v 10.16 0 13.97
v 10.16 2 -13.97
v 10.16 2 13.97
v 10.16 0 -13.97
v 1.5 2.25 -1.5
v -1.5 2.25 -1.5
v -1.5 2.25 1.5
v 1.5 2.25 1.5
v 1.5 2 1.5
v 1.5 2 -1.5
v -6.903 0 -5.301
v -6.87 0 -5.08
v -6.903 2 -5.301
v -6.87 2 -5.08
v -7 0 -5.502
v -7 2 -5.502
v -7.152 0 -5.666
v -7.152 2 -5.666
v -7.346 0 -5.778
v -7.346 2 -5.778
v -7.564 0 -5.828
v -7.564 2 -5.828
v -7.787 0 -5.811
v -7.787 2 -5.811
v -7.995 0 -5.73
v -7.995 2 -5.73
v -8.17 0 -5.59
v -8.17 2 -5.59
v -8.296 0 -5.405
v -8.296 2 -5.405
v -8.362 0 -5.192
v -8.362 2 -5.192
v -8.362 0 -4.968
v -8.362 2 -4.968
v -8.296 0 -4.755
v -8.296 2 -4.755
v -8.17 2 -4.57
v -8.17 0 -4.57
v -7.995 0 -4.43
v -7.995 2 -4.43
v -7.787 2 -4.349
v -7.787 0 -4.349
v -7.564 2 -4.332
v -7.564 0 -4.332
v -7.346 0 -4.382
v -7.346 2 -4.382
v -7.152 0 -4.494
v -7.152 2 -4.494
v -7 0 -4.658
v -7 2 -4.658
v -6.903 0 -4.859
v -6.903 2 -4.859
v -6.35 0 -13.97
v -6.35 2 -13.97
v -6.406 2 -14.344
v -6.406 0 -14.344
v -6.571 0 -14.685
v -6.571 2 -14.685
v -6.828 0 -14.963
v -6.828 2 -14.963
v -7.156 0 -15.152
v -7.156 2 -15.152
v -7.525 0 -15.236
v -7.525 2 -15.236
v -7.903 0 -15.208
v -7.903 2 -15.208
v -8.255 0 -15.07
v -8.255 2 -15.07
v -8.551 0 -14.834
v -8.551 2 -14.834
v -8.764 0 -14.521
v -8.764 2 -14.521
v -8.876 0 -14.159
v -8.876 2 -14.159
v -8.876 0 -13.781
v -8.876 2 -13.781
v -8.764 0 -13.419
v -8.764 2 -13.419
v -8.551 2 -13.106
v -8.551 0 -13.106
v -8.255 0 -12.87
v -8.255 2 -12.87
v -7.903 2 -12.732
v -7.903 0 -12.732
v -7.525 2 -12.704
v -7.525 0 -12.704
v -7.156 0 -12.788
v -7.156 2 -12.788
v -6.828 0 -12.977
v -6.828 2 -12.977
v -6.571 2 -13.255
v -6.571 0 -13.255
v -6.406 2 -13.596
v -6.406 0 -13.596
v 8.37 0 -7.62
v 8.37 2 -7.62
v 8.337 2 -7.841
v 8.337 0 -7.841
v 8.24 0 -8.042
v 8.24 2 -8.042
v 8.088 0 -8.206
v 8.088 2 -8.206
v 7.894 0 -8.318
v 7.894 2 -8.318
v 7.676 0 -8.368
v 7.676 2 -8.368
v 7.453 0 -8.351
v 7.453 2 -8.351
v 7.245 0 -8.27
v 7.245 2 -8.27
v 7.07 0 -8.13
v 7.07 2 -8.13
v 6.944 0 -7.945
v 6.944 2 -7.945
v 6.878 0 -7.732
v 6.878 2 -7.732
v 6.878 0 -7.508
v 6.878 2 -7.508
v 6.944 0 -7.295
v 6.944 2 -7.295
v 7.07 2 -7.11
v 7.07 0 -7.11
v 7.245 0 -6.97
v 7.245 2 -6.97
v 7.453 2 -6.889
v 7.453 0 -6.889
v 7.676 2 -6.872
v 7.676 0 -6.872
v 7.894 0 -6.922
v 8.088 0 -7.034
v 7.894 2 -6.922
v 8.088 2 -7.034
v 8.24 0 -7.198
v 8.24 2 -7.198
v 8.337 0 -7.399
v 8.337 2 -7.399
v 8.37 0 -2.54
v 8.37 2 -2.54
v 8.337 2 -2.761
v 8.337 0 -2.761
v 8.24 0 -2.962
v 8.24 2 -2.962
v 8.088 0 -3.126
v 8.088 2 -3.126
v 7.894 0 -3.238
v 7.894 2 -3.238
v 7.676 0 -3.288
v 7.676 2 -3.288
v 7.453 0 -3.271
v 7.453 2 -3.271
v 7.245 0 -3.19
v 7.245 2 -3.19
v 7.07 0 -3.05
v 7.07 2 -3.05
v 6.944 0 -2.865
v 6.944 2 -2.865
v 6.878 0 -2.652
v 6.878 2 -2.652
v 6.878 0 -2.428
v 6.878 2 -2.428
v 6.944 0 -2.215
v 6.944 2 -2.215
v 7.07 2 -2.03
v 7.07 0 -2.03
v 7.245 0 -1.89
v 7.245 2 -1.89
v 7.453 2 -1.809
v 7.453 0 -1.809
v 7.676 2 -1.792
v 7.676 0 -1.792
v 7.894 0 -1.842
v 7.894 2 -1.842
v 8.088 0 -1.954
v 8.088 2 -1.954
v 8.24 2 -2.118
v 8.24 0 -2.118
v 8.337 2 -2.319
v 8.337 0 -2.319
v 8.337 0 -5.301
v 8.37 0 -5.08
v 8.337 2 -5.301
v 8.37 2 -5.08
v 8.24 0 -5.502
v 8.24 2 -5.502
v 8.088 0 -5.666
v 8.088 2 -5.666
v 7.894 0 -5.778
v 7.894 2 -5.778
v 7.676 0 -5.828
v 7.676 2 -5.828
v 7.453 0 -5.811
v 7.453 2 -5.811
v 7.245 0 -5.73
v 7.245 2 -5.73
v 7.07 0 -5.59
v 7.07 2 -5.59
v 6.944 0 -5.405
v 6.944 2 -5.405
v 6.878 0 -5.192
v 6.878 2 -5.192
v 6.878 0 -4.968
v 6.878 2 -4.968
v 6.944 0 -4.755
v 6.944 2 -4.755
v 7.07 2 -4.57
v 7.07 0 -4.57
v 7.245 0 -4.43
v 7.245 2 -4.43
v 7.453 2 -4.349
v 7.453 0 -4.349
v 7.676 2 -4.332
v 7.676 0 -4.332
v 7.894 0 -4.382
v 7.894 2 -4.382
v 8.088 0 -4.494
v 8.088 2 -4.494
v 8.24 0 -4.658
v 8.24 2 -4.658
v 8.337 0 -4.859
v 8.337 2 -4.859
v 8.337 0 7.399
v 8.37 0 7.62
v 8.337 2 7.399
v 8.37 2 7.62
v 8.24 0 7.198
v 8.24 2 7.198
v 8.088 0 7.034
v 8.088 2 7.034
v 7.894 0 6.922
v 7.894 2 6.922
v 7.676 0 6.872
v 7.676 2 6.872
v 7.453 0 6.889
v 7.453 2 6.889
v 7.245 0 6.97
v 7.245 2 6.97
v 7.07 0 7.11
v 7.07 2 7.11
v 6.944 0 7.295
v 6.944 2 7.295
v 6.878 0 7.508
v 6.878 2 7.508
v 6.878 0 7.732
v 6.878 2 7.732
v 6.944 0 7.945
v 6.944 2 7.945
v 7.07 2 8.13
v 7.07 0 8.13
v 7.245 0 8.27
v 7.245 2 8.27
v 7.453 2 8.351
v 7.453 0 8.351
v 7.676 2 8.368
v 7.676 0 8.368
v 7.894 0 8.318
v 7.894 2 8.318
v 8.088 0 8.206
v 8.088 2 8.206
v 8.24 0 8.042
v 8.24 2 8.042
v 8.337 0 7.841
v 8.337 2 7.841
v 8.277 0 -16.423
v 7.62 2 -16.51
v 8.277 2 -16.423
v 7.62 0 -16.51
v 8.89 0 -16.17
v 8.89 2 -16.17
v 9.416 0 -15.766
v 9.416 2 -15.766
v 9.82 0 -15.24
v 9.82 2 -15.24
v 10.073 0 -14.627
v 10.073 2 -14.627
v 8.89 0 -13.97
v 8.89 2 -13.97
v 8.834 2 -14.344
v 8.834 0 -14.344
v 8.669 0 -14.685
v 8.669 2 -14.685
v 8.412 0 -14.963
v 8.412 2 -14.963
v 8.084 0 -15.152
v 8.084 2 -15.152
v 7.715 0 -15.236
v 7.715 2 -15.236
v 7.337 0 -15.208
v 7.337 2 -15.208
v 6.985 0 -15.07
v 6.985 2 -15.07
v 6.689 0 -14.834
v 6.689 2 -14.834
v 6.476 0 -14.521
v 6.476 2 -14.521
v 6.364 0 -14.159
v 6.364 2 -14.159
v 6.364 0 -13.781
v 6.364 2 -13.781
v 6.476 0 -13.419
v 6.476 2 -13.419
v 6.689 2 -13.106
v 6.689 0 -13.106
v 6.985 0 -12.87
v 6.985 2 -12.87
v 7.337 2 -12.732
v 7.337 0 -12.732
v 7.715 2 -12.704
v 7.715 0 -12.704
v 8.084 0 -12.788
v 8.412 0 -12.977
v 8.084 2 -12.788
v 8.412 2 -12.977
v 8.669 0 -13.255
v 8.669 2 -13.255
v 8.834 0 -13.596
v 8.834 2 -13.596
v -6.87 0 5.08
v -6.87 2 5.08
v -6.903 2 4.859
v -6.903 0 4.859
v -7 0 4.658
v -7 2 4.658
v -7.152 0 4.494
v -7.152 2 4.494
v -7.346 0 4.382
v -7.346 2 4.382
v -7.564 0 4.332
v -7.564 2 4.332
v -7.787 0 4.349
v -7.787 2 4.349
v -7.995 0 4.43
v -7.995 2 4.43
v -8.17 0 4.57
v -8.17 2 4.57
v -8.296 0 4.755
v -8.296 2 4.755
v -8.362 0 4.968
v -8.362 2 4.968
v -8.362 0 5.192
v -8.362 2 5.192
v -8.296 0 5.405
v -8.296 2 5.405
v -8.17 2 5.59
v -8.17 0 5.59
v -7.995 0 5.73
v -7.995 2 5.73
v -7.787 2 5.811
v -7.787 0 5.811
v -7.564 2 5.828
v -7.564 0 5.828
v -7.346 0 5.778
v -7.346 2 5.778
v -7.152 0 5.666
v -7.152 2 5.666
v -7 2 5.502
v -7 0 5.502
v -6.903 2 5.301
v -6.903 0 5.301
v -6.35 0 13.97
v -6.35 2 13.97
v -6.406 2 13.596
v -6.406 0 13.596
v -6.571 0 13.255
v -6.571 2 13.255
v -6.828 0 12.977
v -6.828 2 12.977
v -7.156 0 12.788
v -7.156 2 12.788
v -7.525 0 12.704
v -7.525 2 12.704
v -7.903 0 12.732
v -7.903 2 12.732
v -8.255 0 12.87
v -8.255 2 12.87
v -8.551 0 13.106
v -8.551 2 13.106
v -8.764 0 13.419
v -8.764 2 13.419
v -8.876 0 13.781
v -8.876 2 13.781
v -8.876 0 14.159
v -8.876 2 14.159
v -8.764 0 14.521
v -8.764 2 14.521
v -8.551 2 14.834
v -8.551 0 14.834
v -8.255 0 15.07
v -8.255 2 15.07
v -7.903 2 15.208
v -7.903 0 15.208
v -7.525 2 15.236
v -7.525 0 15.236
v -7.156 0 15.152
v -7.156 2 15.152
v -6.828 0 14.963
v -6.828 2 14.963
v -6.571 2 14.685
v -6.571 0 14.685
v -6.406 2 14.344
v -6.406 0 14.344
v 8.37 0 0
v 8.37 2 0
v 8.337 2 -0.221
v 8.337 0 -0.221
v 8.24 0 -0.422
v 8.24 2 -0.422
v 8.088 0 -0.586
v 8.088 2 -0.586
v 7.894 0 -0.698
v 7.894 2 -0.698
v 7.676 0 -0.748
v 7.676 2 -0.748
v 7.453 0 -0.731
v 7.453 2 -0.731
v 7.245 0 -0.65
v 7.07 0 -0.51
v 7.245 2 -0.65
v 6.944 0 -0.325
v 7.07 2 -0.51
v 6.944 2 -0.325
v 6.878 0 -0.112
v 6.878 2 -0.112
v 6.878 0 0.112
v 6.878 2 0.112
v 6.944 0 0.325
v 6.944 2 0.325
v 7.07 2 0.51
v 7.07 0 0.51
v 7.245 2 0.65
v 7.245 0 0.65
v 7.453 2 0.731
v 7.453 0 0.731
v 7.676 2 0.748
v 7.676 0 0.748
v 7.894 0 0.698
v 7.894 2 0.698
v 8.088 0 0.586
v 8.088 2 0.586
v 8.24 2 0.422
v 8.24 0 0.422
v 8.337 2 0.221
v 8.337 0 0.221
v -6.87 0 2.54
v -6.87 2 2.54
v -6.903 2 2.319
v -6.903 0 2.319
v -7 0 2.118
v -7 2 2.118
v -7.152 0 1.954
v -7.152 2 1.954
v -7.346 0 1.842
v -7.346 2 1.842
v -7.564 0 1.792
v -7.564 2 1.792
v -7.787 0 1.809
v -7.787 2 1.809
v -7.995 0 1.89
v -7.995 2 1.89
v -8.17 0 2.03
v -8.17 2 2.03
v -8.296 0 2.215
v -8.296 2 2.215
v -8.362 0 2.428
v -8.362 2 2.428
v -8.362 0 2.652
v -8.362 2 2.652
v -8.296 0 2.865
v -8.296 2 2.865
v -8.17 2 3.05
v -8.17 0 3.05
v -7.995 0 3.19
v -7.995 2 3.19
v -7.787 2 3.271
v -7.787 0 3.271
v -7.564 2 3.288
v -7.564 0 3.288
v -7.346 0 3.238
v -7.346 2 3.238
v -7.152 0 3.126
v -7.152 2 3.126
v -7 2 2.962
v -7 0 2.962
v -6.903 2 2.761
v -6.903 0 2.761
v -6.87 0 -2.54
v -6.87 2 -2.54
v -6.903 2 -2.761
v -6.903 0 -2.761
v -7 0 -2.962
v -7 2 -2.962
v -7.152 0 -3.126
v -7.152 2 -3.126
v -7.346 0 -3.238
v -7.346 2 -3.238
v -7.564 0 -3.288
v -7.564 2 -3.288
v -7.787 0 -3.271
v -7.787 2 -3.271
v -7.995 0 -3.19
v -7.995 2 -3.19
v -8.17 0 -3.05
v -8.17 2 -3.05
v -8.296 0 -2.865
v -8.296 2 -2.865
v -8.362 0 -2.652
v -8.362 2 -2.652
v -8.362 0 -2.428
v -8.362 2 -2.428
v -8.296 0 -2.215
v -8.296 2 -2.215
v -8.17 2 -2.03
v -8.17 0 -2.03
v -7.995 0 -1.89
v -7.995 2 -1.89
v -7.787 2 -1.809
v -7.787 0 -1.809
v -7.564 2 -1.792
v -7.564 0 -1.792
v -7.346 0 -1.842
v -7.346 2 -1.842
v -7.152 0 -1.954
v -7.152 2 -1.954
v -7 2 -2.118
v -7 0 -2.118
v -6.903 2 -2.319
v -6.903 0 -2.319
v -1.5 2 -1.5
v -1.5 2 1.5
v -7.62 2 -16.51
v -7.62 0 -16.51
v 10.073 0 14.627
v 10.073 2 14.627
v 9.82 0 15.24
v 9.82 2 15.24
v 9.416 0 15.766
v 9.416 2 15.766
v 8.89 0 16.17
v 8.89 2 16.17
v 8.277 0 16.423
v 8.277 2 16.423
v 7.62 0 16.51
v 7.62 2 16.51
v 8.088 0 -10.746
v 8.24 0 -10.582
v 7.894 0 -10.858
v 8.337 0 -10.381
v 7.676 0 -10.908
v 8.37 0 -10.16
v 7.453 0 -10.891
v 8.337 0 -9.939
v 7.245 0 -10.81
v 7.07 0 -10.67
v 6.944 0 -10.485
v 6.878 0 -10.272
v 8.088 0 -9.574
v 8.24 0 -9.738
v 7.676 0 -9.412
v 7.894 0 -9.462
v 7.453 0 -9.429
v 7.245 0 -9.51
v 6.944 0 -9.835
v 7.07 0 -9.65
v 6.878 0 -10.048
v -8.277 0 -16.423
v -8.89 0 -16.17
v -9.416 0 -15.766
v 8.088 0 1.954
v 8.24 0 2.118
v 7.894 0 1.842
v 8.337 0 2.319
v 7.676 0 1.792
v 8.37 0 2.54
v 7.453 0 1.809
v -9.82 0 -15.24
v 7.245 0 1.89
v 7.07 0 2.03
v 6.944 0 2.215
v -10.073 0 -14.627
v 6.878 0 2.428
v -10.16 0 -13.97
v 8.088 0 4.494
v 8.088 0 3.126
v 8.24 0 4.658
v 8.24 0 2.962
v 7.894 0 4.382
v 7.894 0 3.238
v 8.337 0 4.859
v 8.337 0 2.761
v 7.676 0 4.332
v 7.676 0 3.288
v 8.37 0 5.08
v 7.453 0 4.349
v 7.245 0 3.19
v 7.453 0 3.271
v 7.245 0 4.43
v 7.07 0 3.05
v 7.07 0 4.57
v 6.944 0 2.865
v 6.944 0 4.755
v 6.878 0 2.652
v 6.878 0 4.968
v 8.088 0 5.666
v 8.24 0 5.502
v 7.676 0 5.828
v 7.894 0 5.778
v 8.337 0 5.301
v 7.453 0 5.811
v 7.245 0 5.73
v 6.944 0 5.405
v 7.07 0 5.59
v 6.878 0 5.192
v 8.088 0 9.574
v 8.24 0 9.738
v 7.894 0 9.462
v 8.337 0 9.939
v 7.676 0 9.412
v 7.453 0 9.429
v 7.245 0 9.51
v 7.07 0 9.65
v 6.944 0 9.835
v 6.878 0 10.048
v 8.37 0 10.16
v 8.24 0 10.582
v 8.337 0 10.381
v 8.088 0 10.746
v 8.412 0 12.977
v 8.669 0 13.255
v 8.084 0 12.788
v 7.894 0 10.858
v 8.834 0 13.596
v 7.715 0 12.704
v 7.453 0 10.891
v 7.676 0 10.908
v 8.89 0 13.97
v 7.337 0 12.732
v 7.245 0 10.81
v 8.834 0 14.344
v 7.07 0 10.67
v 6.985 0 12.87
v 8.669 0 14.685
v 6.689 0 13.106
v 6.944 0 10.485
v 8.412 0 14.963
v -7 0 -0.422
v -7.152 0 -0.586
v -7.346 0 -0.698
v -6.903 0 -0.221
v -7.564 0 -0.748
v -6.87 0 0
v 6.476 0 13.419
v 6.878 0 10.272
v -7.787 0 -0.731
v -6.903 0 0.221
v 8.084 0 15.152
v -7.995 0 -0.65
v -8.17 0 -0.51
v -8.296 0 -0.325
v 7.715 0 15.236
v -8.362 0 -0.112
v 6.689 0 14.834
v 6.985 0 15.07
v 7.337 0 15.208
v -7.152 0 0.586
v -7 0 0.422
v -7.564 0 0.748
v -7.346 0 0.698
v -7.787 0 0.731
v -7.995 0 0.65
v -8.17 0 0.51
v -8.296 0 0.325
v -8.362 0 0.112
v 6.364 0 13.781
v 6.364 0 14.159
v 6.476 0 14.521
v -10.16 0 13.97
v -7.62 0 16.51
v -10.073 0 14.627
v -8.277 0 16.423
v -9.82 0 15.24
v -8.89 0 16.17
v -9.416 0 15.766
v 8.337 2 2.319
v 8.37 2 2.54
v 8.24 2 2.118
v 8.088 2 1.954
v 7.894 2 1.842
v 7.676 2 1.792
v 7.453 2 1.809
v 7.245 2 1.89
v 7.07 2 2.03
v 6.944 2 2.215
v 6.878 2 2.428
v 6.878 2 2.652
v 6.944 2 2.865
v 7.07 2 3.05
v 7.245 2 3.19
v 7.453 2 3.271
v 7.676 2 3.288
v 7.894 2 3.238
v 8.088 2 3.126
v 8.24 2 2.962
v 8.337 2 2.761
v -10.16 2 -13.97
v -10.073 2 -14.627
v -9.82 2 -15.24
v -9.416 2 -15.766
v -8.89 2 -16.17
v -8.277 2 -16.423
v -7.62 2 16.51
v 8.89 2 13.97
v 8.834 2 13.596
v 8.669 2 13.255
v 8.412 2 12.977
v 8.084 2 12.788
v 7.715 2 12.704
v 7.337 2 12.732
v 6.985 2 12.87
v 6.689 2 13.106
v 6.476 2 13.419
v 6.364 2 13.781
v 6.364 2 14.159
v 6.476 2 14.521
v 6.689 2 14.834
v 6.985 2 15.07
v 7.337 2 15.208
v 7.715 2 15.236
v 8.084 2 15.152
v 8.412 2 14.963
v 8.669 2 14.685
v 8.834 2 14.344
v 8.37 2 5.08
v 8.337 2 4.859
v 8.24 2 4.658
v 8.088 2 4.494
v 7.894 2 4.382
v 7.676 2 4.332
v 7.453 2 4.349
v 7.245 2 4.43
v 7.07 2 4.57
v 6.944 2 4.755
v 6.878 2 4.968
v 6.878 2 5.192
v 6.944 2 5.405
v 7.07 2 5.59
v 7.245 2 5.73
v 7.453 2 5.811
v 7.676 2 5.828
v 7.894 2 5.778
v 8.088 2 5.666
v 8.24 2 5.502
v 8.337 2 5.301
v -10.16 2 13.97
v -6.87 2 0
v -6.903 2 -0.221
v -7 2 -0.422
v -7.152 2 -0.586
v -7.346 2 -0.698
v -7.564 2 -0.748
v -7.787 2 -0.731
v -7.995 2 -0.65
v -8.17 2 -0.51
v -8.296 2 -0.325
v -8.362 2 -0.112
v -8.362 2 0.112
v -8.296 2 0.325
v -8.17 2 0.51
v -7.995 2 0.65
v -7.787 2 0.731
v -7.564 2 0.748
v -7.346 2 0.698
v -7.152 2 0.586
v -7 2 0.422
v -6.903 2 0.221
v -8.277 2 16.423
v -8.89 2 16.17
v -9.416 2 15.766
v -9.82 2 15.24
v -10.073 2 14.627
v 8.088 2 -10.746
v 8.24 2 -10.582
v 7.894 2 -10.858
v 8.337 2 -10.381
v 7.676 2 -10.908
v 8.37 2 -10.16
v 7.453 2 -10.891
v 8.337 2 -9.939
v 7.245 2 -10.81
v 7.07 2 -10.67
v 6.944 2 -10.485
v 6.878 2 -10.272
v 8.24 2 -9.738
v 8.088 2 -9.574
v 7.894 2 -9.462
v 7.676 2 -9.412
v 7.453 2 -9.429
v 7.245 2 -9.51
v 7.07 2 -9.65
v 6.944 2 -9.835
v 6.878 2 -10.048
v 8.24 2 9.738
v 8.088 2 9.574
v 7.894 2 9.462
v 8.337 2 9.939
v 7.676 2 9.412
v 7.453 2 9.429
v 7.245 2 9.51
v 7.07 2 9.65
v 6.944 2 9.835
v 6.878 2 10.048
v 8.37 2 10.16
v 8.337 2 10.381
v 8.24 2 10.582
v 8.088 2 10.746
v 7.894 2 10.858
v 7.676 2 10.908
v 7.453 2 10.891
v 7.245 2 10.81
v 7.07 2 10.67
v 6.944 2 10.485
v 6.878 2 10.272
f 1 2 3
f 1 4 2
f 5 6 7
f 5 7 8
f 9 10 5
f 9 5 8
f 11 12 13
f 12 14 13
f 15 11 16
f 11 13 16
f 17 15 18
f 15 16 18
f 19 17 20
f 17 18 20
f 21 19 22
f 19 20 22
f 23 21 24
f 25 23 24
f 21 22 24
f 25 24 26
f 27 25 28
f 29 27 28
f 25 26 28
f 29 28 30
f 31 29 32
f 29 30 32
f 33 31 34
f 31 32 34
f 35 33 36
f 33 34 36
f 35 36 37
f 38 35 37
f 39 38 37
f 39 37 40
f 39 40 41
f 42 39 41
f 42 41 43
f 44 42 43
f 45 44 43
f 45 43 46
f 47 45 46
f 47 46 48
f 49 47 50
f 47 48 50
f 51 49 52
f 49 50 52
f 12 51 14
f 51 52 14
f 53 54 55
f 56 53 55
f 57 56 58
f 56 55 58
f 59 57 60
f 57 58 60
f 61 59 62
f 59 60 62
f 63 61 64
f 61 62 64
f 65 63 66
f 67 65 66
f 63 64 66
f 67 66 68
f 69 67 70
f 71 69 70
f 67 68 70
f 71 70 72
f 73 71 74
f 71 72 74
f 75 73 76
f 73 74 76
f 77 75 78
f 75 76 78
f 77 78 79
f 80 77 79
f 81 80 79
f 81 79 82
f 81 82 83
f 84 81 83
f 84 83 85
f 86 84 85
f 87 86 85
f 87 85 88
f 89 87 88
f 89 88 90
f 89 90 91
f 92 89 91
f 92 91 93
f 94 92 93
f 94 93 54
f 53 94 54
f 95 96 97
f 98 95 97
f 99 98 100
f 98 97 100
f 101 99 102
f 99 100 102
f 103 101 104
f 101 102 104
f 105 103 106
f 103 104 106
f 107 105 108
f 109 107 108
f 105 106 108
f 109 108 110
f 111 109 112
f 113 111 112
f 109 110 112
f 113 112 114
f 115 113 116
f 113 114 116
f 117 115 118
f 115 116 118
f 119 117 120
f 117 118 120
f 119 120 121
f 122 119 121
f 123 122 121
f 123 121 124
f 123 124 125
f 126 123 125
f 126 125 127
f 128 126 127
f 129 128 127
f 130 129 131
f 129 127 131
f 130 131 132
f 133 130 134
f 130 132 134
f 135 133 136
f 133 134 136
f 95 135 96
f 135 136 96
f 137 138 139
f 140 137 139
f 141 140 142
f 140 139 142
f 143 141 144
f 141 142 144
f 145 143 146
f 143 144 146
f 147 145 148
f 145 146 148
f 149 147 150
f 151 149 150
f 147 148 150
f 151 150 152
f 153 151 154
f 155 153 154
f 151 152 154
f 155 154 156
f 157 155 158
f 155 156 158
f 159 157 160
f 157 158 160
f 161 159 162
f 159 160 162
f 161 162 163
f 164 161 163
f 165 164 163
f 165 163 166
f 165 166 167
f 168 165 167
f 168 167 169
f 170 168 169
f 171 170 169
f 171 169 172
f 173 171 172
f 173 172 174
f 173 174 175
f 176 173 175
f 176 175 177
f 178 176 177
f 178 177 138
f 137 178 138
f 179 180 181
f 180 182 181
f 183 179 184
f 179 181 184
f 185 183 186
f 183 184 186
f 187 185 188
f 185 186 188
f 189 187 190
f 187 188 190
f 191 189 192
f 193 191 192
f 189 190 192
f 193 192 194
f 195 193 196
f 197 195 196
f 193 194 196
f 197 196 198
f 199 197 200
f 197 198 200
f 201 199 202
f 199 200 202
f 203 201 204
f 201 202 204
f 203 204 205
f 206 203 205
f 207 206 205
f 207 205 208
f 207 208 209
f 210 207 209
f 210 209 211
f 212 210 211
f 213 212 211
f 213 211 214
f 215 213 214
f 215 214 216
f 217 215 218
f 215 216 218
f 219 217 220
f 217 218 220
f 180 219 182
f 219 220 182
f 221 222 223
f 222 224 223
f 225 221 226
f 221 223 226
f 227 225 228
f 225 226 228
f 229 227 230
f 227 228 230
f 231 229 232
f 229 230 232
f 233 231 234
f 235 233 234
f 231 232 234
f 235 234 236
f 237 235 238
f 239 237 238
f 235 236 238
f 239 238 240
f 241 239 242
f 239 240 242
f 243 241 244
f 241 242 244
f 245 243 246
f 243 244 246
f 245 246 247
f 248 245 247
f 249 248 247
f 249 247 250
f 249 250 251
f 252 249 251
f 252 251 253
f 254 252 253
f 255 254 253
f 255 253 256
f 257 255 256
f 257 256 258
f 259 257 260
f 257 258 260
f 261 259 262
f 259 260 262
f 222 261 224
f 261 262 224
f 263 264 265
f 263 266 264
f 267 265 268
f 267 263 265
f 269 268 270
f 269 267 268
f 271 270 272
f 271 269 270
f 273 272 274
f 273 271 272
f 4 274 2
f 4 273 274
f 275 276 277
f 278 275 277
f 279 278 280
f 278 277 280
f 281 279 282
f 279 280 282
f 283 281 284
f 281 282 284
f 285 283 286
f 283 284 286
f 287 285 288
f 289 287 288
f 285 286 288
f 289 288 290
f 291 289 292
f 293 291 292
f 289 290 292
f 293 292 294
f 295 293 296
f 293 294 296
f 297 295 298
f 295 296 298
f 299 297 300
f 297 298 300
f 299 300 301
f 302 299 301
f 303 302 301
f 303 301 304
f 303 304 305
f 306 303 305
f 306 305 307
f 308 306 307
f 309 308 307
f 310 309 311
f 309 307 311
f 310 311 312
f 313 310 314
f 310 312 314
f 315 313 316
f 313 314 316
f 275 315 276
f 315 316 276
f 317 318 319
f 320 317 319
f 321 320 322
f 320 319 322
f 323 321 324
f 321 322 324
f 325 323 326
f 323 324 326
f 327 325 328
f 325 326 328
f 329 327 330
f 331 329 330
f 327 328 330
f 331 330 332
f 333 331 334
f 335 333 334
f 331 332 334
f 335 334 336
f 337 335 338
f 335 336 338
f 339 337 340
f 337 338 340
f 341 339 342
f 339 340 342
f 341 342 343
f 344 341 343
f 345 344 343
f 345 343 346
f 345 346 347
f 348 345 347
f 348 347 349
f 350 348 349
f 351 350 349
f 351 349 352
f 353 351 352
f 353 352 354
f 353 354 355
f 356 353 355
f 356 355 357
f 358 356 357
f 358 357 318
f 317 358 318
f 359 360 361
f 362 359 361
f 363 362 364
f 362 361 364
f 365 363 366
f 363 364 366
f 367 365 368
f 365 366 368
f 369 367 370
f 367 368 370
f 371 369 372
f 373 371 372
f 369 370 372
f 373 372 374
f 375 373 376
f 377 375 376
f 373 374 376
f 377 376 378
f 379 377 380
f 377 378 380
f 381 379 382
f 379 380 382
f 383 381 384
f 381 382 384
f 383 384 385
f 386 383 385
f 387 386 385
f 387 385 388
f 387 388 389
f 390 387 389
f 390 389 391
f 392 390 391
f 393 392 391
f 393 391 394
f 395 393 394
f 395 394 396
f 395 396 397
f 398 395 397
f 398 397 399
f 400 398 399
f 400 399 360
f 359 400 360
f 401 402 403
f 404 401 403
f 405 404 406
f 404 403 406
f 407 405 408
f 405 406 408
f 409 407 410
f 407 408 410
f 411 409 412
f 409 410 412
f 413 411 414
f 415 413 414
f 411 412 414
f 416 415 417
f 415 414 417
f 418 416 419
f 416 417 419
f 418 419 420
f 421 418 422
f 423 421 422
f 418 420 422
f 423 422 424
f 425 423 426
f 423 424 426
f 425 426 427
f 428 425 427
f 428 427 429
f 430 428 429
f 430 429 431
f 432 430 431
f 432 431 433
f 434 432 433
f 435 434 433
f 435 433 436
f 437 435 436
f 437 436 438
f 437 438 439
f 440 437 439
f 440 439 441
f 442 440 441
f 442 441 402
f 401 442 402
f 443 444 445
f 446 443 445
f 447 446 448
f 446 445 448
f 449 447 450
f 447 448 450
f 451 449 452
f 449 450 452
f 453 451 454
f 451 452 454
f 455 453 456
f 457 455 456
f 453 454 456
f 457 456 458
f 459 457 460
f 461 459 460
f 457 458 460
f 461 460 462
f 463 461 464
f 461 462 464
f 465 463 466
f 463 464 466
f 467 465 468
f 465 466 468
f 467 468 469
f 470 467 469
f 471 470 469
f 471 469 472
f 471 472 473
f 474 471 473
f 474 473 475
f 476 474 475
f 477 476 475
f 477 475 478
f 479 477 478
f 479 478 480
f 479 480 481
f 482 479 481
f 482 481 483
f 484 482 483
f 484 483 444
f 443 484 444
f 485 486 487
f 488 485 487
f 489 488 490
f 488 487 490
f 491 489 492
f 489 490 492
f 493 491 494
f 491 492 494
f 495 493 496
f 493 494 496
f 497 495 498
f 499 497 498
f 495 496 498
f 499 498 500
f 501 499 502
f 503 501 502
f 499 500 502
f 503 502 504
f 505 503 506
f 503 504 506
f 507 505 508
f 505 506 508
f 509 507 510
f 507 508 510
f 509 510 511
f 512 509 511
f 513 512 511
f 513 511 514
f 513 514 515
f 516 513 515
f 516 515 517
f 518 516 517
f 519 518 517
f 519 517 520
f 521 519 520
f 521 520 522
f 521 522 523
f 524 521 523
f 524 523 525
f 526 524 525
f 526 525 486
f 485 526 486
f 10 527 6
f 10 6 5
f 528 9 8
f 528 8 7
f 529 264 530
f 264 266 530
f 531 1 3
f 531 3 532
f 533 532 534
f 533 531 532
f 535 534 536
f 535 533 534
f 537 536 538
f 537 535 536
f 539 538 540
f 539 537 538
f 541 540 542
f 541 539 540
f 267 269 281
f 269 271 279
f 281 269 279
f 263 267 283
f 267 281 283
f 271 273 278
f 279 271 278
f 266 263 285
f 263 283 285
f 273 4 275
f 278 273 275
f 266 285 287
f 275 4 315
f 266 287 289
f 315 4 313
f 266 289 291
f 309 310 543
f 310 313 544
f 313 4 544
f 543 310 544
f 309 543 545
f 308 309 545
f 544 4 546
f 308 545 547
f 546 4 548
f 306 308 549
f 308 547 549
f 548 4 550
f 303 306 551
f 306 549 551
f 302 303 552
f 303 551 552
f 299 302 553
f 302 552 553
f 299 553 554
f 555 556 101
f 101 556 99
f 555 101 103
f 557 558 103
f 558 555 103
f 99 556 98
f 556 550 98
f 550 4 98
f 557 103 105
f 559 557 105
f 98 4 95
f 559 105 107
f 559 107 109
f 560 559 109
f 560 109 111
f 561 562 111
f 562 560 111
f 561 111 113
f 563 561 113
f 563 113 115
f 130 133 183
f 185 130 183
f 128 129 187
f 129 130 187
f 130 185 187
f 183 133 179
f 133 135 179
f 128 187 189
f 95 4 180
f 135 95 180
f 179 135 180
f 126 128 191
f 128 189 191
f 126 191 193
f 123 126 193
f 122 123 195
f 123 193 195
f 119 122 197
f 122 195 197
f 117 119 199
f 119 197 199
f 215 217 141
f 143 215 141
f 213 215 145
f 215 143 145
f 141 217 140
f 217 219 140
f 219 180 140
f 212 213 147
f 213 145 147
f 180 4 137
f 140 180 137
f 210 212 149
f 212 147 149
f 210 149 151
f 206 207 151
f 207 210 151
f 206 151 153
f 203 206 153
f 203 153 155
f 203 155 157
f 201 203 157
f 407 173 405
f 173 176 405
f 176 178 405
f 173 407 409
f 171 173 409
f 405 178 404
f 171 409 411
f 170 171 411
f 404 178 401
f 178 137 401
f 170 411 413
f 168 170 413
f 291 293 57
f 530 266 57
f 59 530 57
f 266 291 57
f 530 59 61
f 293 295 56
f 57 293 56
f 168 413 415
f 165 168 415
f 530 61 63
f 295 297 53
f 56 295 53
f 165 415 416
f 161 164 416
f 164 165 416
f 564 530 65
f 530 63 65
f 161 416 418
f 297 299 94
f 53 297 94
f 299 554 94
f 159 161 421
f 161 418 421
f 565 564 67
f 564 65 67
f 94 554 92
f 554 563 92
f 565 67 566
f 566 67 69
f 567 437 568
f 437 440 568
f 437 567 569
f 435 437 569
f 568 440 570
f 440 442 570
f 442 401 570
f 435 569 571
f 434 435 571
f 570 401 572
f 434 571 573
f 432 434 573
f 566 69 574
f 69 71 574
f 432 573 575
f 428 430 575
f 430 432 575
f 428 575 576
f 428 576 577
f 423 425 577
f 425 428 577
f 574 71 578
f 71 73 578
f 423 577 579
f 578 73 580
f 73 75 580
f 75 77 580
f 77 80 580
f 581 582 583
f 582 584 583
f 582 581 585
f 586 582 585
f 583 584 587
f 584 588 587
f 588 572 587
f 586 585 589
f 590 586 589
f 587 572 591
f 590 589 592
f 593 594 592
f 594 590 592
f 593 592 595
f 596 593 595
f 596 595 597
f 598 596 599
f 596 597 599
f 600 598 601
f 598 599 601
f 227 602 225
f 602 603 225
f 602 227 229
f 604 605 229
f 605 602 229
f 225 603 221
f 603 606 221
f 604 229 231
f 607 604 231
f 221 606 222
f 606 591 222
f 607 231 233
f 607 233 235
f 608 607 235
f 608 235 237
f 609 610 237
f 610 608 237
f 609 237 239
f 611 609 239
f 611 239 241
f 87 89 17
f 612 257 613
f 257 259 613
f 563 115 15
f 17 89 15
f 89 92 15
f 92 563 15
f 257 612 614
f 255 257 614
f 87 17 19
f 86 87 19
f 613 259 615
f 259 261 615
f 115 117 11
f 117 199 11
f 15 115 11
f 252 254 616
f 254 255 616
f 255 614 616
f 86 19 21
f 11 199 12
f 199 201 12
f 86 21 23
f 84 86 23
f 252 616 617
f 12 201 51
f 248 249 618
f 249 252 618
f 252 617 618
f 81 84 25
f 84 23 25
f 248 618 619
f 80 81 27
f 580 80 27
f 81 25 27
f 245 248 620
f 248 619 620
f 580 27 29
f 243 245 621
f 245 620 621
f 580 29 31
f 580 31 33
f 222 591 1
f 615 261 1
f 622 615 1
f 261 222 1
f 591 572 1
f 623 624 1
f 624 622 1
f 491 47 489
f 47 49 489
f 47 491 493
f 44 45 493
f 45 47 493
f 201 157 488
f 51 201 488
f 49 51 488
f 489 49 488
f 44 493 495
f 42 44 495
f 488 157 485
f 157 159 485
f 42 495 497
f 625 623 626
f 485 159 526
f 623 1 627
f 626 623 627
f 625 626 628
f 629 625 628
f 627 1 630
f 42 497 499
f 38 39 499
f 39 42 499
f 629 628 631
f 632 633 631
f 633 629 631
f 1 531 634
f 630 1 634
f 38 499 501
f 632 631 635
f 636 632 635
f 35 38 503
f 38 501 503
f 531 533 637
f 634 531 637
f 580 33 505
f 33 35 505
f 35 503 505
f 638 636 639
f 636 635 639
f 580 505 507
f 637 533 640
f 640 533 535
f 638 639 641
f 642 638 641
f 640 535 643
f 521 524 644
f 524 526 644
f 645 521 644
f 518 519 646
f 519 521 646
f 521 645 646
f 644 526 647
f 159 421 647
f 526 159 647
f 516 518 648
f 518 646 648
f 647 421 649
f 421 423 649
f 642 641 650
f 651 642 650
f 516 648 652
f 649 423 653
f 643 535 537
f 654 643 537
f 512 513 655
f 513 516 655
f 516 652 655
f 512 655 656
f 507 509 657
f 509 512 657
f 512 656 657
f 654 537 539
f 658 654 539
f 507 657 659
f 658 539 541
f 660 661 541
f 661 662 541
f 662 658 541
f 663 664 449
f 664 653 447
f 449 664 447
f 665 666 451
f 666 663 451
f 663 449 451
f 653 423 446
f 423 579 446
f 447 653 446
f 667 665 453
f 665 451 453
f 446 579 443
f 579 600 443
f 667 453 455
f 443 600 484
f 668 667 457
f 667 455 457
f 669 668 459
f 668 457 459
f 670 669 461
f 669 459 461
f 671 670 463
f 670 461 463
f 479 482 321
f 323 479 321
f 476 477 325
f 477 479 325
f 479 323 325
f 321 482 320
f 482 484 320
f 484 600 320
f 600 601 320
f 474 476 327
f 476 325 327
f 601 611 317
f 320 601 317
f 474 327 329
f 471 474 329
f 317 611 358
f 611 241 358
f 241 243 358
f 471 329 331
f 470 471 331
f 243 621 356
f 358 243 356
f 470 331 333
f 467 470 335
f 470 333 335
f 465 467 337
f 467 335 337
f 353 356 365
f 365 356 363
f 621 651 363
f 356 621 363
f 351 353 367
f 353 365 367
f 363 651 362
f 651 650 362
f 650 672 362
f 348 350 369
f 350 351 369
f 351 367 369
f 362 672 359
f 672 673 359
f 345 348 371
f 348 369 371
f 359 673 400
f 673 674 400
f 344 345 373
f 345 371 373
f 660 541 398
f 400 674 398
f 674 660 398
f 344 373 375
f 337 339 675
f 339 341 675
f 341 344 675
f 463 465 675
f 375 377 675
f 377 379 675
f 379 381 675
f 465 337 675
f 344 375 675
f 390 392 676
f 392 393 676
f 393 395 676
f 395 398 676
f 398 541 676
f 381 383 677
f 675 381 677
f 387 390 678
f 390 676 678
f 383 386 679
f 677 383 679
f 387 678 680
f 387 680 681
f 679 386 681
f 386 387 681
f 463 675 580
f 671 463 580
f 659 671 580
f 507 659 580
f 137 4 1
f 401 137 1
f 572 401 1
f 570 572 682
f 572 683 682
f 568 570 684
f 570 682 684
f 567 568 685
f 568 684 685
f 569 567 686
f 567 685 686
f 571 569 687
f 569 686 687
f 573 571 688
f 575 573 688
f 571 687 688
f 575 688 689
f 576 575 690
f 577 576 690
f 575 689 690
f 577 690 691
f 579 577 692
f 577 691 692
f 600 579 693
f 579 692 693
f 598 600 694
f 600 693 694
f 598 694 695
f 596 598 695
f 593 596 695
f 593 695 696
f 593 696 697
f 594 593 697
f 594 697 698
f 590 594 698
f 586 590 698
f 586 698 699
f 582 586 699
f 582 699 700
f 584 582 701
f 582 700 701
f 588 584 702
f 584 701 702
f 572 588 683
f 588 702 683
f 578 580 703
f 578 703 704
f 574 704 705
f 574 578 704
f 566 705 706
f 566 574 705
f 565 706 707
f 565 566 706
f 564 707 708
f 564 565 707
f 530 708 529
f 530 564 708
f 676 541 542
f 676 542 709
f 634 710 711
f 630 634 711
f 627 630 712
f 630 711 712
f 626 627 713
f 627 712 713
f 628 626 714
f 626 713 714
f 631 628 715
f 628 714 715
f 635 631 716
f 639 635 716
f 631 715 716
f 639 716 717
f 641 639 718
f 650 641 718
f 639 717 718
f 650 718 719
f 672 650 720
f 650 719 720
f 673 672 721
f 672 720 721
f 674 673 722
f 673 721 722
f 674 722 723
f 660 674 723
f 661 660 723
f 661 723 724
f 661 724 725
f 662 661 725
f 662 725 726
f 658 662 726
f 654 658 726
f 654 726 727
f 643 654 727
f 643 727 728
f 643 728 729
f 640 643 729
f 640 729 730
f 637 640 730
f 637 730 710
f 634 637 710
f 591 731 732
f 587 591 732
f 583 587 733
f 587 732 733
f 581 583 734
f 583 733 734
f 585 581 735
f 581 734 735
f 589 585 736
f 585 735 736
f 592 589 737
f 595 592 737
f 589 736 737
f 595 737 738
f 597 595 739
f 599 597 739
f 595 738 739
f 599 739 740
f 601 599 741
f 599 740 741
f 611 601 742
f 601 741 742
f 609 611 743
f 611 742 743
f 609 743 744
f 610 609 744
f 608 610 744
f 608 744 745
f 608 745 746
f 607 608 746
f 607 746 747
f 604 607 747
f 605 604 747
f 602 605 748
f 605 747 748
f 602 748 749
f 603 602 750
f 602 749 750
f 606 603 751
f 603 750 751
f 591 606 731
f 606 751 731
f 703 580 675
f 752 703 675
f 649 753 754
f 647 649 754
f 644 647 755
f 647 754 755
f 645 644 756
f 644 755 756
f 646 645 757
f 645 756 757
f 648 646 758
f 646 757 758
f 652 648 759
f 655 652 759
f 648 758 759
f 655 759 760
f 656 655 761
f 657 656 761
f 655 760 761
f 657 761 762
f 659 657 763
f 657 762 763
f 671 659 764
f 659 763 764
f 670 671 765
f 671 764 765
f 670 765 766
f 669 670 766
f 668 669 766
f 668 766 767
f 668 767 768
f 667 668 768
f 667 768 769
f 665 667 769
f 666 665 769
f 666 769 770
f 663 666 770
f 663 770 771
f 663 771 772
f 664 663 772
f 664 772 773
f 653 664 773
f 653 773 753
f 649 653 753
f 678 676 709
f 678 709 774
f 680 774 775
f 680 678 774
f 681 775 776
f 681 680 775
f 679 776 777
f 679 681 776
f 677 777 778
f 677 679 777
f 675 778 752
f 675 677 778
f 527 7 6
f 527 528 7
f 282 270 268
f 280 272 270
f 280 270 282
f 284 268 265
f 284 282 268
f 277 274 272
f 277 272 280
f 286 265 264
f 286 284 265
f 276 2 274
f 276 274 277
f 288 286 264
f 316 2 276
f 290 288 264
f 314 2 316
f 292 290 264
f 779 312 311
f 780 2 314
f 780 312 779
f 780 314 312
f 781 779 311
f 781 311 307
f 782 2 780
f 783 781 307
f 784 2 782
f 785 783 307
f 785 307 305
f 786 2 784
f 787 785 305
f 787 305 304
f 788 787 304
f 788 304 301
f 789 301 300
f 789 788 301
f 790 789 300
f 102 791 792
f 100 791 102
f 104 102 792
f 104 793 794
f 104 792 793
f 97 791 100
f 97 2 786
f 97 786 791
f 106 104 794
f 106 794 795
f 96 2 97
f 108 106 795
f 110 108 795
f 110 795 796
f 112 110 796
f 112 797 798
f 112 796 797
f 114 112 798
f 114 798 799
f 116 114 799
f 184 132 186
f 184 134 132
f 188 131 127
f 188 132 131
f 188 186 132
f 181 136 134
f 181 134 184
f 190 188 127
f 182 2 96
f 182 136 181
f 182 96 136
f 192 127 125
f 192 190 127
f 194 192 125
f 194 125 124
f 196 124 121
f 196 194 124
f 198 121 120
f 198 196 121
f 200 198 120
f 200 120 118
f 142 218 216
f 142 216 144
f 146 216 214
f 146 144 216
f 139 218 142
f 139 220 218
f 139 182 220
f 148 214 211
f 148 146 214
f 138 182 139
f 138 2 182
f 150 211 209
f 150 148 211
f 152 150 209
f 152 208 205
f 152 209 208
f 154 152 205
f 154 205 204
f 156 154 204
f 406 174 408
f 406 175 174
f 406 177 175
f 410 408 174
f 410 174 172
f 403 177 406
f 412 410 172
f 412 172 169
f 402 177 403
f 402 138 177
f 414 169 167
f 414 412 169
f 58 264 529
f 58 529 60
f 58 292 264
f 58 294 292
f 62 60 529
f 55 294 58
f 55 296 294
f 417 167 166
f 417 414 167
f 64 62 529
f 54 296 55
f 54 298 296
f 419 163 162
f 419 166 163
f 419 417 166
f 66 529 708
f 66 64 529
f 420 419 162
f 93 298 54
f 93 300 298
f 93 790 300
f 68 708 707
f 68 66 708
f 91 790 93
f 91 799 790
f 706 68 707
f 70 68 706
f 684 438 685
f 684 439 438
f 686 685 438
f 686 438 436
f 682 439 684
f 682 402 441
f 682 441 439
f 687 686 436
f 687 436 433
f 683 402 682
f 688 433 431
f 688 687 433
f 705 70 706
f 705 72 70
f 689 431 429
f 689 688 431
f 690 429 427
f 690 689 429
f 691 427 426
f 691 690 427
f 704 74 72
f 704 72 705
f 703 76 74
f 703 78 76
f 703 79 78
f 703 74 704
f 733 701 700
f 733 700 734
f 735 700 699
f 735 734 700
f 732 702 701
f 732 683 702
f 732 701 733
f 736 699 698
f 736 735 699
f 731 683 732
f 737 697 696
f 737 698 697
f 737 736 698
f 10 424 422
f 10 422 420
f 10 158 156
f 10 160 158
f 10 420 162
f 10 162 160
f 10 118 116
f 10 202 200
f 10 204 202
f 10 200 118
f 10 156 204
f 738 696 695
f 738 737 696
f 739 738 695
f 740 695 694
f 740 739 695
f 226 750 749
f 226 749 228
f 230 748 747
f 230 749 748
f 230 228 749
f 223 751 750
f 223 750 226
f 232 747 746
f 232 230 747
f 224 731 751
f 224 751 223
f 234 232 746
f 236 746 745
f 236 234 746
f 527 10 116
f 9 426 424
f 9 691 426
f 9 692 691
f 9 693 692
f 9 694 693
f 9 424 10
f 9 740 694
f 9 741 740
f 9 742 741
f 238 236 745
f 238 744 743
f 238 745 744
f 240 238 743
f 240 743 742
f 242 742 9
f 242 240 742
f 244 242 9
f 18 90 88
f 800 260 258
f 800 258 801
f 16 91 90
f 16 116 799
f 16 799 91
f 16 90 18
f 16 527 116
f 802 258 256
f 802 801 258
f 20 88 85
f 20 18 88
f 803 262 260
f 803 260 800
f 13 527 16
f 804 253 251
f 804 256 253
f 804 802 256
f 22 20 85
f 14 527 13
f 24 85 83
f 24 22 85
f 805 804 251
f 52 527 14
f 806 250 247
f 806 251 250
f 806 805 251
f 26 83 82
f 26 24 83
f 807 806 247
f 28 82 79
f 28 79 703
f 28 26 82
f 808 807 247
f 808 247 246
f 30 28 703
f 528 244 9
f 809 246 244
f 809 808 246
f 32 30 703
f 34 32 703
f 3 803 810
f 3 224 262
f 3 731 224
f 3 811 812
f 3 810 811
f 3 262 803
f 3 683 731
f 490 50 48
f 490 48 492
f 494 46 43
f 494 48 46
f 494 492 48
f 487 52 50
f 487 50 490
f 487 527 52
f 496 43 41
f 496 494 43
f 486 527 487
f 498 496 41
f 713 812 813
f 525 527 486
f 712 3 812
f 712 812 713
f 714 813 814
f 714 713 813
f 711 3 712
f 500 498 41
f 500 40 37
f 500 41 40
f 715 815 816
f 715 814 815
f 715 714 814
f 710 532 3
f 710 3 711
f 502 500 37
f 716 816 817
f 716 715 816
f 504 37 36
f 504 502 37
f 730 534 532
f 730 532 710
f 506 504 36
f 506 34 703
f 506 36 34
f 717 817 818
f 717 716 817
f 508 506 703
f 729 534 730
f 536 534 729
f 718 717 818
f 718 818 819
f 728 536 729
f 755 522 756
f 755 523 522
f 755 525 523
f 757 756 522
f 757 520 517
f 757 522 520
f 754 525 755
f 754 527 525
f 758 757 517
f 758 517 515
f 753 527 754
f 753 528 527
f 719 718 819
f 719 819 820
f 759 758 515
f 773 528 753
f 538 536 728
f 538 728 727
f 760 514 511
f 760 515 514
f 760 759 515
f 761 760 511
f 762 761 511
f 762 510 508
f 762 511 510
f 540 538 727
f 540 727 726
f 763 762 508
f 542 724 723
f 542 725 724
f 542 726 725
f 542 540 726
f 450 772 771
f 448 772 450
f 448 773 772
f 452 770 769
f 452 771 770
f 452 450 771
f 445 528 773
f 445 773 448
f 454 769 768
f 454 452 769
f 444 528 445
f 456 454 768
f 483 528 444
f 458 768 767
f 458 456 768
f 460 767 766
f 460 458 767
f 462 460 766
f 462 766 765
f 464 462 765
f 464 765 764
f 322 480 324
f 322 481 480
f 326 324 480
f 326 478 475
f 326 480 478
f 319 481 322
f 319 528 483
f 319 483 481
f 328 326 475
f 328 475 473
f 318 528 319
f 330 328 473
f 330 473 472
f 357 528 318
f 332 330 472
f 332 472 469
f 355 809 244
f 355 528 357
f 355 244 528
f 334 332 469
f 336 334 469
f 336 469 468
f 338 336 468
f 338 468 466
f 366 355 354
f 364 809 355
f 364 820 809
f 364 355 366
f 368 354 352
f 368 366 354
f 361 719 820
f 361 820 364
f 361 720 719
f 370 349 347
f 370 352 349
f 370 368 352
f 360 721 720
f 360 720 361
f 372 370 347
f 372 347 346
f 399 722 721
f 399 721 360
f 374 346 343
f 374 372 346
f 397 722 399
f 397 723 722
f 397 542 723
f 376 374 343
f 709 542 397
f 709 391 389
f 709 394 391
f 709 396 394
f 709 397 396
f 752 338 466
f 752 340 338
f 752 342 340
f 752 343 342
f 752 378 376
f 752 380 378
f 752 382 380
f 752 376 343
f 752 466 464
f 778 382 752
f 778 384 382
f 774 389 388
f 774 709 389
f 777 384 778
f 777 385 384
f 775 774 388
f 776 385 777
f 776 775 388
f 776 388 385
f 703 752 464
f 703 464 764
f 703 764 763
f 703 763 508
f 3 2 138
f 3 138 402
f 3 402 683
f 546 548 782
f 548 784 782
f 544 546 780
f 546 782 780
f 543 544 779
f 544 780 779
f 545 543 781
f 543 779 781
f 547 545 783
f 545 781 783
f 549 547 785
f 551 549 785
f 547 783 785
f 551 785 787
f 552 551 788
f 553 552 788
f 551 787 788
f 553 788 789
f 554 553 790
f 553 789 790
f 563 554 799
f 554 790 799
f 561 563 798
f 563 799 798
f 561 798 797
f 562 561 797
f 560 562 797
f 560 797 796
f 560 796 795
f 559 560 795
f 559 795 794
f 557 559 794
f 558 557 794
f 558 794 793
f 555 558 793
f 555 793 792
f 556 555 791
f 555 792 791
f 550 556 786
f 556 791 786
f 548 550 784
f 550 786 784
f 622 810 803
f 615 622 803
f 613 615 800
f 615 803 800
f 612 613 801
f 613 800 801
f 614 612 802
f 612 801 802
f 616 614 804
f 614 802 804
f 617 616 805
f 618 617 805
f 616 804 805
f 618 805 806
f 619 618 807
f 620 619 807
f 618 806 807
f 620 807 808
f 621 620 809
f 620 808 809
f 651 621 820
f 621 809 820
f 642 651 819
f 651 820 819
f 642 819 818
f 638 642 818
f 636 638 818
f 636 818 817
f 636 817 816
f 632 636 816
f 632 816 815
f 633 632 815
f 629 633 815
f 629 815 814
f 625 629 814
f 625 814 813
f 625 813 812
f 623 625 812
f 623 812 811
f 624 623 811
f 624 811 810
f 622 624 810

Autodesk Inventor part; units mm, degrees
ref_plane "YZ Plane" through (0, 0, 0) normal (1, 0, 0) x (0, 1, 0)
ref_plane "XZ Plane" through (0, 0, 0) normal (0, 1, 0) x (-1, 0, 0)
ref_plane "XY Plane" through (0, 0, 0) normal (0, 0, 1) x (1, 0, 0)
sketch "Sketch1" plane through (0, 0, 0) normal (0, 1, 0) x (-1, 0, 0)
  line L0 (0, 0) -> (10.16, 0)
  line L1 (10.16, 0) -> (10.16, -13.97)
  line L2 (10.16, 0) -> (10.16, 13.97)
  line L3 (10.16, 0) -> (24.13, 0) construction
  line L4 (0, 0) -> (-10.16, 0)
  line L5 (0, 0) -> (10.16, 0) construction
  line L6 (-10.16, 0) -> (-10.16, -13.97)
  line L7 (-10.16, 0) -> (-10.16, 13.97)
  line L8 (-10.16, 13.97) -> (-7.62, 13.97)
  arc A0 (-7.62, 16.51) -> (-10.16, 13.97) centre (-7.62, 13.97) ccw
  line L9 (-7.62, 13.97) -> (-7.62, 16.51) construction
  line L10 (-7.62, 13.97) -> (-10.16, 13.97) construction
  line L11 (0, 0) -> (0, -1)
  line L12 (10.16, 13.97) -> (7.62, 13.97)
  line L13 (10.16, 13.97) -> (12.7, 13.97) construction
  arc A1 (10.16, 13.97) -> (7.62, 16.51) centre (7.62, 13.97) ccw
  line L14 (7.62, 13.97) -> (7.62, 16.51) construction
  line L15 (7.62, 13.97) -> (10.16, 13.97) construction
  line L16 (-7.62, 16.51) -> (7.62, 16.51)
  line L17 (10.16, -13.97) -> (7.62, -13.97)
  line L18 (10.16, -13.97) -> (12.7, -13.97) construction
  line L19 (-10.16, -13.97) -> (-7.62, -13.97)
  arc A2 (7.62, -16.51) -> (10.16, -13.97) centre (7.62, -13.97) ccw
  arc A3 (-10.16, -13.97) -> (-7.62, -16.51) centre (-7.62, -13.97) ccw
  line L20 (-7.62, -16.51) -> (7.62, -16.51)
  dimension "d0" = 10.16
  dimension "d1" = 13.97
  dimension "d2" = 13.97
  dimension "d3" = 90
  dimension "d4" = 10.16
  dimension "d5" = 180
  dimension "d6" = 13.97
  dimension "d7" = 13.97
  dimension "d8" = 2.54
  dimension "d9" = 90
  dimension "d11" = 1
  dimension "d12" = 2.54
  dimension "d13" = 180
  dimension "d14" = 90
  dimension "d15" = 2.54
  dimension "d16" = 180
  dimension "d17" = 2.54
  dimension "d18" = 15.24
extrude "Extrusion1" add sketch "Sketch1" along normal blind 2
sketch "Sketch2" plane through (0, 2, 0) normal (0, 1, 0) x (1, 0, 0)
  line L0 (0, 0) -> (7.62, 0)
  line L1 (0, 0) -> (-7.62, 0)
  circle A0 centre (7.62, 0) radius 0.75
  line L2 (0, 0) -> (0, 1)
  circle A1 centre (7.62, 2.54) radius 0.75
  circle A2 centre (7.62, 5.08) radius 0.75
  circle A3 centre (7.62, 7.62) radius 0.75
  circle A4 centre (7.62, 10.16) radius 0.75
  circle A5 centre (7.62, -2.54) radius 0.75
  circle A6 centre (7.62, 0) radius 0.75
  circle A7 centre (7.62, 2.54) radius 0.75
  circle A8 centre (7.62, 5.08) radius 0.75
  circle A9 centre (7.62, 7.62) radius 0.75
  circle A10 centre (7.62, -5.08) radius 0.75
  circle A11 centre (7.62, -2.54) radius 0.75
  circle A12 centre (7.62, 0) radius 0.75
  circle A13 centre (7.62, 2.54) radius 0.75
  circle A14 centre (7.62, 5.08) radius 0.75
  circle A15 centre (7.62, -7.62) radius 0.75
  circle A16 centre (7.62, -5.08) radius 0.75
  circle A17 centre (7.62, -2.54) radius 0.75
  circle A18 centre (7.62, 0) radius 0.75
  circle A19 centre (7.62, 2.54) radius 0.75
  circle A20 centre (7.62, -10.16) radius 0.75
  circle A21 centre (7.62, -7.62) radius 0.75
  circle A22 centre (7.62, -5.08) radius 0.75
  circle A23 centre (7.62, -2.54) radius 0.75
  circle A24 centre (7.62, 0) radius 0.75
  circle A25 centre (-7.62, 0) radius 0.75
  circle A26 centre (-7.62, 2.54) radius 0.75
  circle A27 centre (-7.62, 5.08) radius 0.75
  circle A28 centre (-7.62, -2.54) radius 0.75
  circle A29 centre (-7.62, 0) radius 0.75
  circle A30 centre (-7.62, 2.54) radius 0.75
  circle A31 centre (-7.62, -5.08) radius 0.75
  circle A32 centre (-7.62, -2.54) radius 0.75
  circle A33 centre (-7.62, 0) radius 0.75
  dimension "d21" = 7.62
  dimension "d22" = 7.62
  dimension "d23" = 1.5
  dimension "d24" = 1
  dimension "d27" = 2.54
  dimension "d30" = 2.54
  dimension "d33" = 1.5
  dimension "d36" = 2.54
  dimension "d39" = 2.54
extrude "Extrusion2" cut sketch "Sketch2" against normal blind 2
sketch "Sketch3" plane through (0, 2, 0) normal (0, 1, 0) x (1, 0, 0)
  line L0 (1.5, -1.5) -> (-1.5, -1.5)
  line L1 (-1.5, -1.5) -> (-1.5, 1.5)
  line L2 (-1.5, 1.5) -> (1.5, 1.5)
  line L3 (1.5, 1.5) -> (1.5, -1.5)
  line L4 (1.5, -1.5) -> (-1.5, 1.5) construction
  line L5 (-1.5, -1.5) -> (1.5, 1.5) construction
  point P0 (0, 0)
  dimension "d44" = 3
  dimension "d45" = 3
extrude "Extrusion3" add sketch "Sketch3" along normal blind 0.25
sketch "Sketch4" plane through (0, 2, 0) normal (0, 1, 0) x (1, 0, 0)
  arc A0 (7.62, -16.51) -> (10.16, -13.97) centre (7.62, -13.97) ccw projected
  circle A1 centre (7.62, -13.97) radius 1.27
  line L0 (1.5, -1.5) -> (1.5, 1.5) projected
  line L1 (1.5, -1.5) -> (1.5, 1.5)
  line L2 (-1.5, 1.5) -> (-1.5, -1.5) projected
  line L3 (1.5, 1.5) -> (-1.5, 1.5)
  circle A2 centre (7.62, 13.97) radius 1.27
  circle A3 centre (-7.62, -13.97) radius 1.27
  circle A4 centre (-7.62, 13.97) radius 1.27
  point P0 (0, 0)
  dimension "d48" = 2.54
  dimension "d51" = 27.94
  dimension "d54" = 15.24
extrude "Extrusion4" cut sketch "Sketch4" against normal blind 2
properties part number "LSM9DS1"
